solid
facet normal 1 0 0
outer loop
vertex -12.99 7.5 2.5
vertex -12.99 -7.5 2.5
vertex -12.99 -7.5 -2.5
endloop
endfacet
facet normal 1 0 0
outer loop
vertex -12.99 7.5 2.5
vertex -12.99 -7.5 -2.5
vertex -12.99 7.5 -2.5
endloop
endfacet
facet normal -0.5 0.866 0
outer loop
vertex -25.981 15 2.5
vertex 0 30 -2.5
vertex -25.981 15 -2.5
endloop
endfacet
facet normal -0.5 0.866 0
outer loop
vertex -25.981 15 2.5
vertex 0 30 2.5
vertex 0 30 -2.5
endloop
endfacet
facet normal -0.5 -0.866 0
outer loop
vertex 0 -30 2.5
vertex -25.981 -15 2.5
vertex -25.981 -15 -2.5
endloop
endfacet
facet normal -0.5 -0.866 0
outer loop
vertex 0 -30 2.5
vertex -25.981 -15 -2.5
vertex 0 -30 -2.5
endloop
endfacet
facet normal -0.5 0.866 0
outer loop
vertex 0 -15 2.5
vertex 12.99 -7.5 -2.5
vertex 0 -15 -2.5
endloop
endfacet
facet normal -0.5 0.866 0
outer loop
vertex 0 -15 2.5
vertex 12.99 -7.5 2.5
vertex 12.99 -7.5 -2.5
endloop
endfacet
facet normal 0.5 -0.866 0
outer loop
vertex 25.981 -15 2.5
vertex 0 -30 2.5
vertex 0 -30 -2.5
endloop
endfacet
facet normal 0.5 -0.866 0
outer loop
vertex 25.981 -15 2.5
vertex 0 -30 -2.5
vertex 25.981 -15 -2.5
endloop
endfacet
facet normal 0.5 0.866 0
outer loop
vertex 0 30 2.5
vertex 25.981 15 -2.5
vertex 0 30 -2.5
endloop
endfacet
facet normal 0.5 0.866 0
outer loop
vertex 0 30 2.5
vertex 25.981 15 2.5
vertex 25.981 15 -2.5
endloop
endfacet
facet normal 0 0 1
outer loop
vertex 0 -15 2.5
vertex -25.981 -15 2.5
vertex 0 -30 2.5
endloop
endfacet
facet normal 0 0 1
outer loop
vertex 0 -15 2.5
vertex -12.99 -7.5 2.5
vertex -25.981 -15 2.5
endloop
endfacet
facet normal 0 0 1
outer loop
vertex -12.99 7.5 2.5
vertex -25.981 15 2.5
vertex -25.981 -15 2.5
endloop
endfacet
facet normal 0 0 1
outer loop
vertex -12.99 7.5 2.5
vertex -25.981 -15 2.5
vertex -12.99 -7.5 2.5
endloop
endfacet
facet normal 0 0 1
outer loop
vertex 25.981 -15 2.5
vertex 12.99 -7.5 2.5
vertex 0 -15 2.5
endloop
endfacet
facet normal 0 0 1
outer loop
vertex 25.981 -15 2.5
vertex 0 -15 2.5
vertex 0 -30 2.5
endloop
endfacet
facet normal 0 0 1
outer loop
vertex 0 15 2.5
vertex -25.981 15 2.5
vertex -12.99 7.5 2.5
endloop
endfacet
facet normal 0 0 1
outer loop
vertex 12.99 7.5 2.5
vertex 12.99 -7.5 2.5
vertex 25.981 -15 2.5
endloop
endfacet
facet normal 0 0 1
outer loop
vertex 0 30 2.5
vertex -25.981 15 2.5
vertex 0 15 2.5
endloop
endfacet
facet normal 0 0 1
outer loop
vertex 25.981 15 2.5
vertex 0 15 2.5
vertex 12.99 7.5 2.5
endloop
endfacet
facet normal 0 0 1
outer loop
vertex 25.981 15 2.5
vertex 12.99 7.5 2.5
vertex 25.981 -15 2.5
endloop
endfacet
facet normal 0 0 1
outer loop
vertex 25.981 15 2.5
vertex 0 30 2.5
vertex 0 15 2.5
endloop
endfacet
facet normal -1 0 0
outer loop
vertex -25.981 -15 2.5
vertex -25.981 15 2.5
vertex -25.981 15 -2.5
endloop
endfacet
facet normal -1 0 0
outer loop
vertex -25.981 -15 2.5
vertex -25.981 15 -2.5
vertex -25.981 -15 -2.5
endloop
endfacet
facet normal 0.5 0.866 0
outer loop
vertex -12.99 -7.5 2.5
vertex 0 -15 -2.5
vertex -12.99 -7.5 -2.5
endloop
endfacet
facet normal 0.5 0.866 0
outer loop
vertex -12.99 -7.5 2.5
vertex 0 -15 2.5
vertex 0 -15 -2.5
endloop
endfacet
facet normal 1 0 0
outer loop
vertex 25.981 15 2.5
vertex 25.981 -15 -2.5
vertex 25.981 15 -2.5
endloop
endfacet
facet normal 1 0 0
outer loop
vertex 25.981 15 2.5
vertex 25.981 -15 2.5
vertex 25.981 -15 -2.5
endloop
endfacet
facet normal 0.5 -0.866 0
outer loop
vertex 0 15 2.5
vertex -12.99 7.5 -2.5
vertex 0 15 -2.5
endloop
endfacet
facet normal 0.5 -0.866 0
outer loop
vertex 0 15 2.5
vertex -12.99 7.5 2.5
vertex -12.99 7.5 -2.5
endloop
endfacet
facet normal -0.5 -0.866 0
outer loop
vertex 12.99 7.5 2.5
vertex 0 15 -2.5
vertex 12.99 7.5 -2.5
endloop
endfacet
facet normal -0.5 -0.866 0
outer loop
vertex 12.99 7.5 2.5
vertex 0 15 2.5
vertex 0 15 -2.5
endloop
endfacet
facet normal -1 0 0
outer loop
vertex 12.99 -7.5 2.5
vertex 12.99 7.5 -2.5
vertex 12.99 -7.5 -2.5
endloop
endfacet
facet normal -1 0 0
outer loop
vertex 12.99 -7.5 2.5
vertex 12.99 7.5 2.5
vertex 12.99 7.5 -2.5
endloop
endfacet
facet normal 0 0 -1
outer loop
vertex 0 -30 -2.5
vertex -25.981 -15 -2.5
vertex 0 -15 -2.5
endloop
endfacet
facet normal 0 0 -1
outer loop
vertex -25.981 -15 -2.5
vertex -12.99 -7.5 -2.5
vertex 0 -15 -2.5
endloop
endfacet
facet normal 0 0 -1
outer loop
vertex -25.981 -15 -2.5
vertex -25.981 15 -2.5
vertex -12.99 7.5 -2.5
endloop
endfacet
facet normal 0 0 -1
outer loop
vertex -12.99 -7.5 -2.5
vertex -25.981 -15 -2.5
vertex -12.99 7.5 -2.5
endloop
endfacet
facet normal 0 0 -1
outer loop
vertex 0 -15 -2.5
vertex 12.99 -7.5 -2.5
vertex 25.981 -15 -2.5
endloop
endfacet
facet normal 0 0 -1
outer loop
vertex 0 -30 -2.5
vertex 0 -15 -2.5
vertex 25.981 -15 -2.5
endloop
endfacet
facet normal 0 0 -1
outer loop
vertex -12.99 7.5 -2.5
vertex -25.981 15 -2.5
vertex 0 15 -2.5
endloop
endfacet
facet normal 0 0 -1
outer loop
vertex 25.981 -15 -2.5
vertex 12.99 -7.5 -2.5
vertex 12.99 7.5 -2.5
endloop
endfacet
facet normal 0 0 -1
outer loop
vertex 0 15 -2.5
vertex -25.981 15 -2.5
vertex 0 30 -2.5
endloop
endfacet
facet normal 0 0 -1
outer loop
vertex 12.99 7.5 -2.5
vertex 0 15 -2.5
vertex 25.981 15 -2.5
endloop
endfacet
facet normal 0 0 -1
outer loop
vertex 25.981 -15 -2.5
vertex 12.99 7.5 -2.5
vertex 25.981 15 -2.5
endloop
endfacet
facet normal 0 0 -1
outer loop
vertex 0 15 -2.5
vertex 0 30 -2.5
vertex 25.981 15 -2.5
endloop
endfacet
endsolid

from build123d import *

# Parameters (mm, degrees)
F1_DEPTH = 2.5


with BuildPart() as f1:
    # F0 (on Top) → F1 (new body, symmetric)
    with BuildSketch(Plane.XY):
        Polygon((0, 30), (-25.980762, 15), (-25.980762, -15), (0, -30), (25.980762, -15), (25.980762, 15), align=None)
        Polygon((-12.990381, -7.5), (-12.990381, 7.5), (0, 15), (12.990381, 7.5), (12.990381, -7.5), (0, -15), align=None, mode=Mode.SUBTRACT)
    extrude(amount=F1_DEPTH, both=True)


solid = f1.part
